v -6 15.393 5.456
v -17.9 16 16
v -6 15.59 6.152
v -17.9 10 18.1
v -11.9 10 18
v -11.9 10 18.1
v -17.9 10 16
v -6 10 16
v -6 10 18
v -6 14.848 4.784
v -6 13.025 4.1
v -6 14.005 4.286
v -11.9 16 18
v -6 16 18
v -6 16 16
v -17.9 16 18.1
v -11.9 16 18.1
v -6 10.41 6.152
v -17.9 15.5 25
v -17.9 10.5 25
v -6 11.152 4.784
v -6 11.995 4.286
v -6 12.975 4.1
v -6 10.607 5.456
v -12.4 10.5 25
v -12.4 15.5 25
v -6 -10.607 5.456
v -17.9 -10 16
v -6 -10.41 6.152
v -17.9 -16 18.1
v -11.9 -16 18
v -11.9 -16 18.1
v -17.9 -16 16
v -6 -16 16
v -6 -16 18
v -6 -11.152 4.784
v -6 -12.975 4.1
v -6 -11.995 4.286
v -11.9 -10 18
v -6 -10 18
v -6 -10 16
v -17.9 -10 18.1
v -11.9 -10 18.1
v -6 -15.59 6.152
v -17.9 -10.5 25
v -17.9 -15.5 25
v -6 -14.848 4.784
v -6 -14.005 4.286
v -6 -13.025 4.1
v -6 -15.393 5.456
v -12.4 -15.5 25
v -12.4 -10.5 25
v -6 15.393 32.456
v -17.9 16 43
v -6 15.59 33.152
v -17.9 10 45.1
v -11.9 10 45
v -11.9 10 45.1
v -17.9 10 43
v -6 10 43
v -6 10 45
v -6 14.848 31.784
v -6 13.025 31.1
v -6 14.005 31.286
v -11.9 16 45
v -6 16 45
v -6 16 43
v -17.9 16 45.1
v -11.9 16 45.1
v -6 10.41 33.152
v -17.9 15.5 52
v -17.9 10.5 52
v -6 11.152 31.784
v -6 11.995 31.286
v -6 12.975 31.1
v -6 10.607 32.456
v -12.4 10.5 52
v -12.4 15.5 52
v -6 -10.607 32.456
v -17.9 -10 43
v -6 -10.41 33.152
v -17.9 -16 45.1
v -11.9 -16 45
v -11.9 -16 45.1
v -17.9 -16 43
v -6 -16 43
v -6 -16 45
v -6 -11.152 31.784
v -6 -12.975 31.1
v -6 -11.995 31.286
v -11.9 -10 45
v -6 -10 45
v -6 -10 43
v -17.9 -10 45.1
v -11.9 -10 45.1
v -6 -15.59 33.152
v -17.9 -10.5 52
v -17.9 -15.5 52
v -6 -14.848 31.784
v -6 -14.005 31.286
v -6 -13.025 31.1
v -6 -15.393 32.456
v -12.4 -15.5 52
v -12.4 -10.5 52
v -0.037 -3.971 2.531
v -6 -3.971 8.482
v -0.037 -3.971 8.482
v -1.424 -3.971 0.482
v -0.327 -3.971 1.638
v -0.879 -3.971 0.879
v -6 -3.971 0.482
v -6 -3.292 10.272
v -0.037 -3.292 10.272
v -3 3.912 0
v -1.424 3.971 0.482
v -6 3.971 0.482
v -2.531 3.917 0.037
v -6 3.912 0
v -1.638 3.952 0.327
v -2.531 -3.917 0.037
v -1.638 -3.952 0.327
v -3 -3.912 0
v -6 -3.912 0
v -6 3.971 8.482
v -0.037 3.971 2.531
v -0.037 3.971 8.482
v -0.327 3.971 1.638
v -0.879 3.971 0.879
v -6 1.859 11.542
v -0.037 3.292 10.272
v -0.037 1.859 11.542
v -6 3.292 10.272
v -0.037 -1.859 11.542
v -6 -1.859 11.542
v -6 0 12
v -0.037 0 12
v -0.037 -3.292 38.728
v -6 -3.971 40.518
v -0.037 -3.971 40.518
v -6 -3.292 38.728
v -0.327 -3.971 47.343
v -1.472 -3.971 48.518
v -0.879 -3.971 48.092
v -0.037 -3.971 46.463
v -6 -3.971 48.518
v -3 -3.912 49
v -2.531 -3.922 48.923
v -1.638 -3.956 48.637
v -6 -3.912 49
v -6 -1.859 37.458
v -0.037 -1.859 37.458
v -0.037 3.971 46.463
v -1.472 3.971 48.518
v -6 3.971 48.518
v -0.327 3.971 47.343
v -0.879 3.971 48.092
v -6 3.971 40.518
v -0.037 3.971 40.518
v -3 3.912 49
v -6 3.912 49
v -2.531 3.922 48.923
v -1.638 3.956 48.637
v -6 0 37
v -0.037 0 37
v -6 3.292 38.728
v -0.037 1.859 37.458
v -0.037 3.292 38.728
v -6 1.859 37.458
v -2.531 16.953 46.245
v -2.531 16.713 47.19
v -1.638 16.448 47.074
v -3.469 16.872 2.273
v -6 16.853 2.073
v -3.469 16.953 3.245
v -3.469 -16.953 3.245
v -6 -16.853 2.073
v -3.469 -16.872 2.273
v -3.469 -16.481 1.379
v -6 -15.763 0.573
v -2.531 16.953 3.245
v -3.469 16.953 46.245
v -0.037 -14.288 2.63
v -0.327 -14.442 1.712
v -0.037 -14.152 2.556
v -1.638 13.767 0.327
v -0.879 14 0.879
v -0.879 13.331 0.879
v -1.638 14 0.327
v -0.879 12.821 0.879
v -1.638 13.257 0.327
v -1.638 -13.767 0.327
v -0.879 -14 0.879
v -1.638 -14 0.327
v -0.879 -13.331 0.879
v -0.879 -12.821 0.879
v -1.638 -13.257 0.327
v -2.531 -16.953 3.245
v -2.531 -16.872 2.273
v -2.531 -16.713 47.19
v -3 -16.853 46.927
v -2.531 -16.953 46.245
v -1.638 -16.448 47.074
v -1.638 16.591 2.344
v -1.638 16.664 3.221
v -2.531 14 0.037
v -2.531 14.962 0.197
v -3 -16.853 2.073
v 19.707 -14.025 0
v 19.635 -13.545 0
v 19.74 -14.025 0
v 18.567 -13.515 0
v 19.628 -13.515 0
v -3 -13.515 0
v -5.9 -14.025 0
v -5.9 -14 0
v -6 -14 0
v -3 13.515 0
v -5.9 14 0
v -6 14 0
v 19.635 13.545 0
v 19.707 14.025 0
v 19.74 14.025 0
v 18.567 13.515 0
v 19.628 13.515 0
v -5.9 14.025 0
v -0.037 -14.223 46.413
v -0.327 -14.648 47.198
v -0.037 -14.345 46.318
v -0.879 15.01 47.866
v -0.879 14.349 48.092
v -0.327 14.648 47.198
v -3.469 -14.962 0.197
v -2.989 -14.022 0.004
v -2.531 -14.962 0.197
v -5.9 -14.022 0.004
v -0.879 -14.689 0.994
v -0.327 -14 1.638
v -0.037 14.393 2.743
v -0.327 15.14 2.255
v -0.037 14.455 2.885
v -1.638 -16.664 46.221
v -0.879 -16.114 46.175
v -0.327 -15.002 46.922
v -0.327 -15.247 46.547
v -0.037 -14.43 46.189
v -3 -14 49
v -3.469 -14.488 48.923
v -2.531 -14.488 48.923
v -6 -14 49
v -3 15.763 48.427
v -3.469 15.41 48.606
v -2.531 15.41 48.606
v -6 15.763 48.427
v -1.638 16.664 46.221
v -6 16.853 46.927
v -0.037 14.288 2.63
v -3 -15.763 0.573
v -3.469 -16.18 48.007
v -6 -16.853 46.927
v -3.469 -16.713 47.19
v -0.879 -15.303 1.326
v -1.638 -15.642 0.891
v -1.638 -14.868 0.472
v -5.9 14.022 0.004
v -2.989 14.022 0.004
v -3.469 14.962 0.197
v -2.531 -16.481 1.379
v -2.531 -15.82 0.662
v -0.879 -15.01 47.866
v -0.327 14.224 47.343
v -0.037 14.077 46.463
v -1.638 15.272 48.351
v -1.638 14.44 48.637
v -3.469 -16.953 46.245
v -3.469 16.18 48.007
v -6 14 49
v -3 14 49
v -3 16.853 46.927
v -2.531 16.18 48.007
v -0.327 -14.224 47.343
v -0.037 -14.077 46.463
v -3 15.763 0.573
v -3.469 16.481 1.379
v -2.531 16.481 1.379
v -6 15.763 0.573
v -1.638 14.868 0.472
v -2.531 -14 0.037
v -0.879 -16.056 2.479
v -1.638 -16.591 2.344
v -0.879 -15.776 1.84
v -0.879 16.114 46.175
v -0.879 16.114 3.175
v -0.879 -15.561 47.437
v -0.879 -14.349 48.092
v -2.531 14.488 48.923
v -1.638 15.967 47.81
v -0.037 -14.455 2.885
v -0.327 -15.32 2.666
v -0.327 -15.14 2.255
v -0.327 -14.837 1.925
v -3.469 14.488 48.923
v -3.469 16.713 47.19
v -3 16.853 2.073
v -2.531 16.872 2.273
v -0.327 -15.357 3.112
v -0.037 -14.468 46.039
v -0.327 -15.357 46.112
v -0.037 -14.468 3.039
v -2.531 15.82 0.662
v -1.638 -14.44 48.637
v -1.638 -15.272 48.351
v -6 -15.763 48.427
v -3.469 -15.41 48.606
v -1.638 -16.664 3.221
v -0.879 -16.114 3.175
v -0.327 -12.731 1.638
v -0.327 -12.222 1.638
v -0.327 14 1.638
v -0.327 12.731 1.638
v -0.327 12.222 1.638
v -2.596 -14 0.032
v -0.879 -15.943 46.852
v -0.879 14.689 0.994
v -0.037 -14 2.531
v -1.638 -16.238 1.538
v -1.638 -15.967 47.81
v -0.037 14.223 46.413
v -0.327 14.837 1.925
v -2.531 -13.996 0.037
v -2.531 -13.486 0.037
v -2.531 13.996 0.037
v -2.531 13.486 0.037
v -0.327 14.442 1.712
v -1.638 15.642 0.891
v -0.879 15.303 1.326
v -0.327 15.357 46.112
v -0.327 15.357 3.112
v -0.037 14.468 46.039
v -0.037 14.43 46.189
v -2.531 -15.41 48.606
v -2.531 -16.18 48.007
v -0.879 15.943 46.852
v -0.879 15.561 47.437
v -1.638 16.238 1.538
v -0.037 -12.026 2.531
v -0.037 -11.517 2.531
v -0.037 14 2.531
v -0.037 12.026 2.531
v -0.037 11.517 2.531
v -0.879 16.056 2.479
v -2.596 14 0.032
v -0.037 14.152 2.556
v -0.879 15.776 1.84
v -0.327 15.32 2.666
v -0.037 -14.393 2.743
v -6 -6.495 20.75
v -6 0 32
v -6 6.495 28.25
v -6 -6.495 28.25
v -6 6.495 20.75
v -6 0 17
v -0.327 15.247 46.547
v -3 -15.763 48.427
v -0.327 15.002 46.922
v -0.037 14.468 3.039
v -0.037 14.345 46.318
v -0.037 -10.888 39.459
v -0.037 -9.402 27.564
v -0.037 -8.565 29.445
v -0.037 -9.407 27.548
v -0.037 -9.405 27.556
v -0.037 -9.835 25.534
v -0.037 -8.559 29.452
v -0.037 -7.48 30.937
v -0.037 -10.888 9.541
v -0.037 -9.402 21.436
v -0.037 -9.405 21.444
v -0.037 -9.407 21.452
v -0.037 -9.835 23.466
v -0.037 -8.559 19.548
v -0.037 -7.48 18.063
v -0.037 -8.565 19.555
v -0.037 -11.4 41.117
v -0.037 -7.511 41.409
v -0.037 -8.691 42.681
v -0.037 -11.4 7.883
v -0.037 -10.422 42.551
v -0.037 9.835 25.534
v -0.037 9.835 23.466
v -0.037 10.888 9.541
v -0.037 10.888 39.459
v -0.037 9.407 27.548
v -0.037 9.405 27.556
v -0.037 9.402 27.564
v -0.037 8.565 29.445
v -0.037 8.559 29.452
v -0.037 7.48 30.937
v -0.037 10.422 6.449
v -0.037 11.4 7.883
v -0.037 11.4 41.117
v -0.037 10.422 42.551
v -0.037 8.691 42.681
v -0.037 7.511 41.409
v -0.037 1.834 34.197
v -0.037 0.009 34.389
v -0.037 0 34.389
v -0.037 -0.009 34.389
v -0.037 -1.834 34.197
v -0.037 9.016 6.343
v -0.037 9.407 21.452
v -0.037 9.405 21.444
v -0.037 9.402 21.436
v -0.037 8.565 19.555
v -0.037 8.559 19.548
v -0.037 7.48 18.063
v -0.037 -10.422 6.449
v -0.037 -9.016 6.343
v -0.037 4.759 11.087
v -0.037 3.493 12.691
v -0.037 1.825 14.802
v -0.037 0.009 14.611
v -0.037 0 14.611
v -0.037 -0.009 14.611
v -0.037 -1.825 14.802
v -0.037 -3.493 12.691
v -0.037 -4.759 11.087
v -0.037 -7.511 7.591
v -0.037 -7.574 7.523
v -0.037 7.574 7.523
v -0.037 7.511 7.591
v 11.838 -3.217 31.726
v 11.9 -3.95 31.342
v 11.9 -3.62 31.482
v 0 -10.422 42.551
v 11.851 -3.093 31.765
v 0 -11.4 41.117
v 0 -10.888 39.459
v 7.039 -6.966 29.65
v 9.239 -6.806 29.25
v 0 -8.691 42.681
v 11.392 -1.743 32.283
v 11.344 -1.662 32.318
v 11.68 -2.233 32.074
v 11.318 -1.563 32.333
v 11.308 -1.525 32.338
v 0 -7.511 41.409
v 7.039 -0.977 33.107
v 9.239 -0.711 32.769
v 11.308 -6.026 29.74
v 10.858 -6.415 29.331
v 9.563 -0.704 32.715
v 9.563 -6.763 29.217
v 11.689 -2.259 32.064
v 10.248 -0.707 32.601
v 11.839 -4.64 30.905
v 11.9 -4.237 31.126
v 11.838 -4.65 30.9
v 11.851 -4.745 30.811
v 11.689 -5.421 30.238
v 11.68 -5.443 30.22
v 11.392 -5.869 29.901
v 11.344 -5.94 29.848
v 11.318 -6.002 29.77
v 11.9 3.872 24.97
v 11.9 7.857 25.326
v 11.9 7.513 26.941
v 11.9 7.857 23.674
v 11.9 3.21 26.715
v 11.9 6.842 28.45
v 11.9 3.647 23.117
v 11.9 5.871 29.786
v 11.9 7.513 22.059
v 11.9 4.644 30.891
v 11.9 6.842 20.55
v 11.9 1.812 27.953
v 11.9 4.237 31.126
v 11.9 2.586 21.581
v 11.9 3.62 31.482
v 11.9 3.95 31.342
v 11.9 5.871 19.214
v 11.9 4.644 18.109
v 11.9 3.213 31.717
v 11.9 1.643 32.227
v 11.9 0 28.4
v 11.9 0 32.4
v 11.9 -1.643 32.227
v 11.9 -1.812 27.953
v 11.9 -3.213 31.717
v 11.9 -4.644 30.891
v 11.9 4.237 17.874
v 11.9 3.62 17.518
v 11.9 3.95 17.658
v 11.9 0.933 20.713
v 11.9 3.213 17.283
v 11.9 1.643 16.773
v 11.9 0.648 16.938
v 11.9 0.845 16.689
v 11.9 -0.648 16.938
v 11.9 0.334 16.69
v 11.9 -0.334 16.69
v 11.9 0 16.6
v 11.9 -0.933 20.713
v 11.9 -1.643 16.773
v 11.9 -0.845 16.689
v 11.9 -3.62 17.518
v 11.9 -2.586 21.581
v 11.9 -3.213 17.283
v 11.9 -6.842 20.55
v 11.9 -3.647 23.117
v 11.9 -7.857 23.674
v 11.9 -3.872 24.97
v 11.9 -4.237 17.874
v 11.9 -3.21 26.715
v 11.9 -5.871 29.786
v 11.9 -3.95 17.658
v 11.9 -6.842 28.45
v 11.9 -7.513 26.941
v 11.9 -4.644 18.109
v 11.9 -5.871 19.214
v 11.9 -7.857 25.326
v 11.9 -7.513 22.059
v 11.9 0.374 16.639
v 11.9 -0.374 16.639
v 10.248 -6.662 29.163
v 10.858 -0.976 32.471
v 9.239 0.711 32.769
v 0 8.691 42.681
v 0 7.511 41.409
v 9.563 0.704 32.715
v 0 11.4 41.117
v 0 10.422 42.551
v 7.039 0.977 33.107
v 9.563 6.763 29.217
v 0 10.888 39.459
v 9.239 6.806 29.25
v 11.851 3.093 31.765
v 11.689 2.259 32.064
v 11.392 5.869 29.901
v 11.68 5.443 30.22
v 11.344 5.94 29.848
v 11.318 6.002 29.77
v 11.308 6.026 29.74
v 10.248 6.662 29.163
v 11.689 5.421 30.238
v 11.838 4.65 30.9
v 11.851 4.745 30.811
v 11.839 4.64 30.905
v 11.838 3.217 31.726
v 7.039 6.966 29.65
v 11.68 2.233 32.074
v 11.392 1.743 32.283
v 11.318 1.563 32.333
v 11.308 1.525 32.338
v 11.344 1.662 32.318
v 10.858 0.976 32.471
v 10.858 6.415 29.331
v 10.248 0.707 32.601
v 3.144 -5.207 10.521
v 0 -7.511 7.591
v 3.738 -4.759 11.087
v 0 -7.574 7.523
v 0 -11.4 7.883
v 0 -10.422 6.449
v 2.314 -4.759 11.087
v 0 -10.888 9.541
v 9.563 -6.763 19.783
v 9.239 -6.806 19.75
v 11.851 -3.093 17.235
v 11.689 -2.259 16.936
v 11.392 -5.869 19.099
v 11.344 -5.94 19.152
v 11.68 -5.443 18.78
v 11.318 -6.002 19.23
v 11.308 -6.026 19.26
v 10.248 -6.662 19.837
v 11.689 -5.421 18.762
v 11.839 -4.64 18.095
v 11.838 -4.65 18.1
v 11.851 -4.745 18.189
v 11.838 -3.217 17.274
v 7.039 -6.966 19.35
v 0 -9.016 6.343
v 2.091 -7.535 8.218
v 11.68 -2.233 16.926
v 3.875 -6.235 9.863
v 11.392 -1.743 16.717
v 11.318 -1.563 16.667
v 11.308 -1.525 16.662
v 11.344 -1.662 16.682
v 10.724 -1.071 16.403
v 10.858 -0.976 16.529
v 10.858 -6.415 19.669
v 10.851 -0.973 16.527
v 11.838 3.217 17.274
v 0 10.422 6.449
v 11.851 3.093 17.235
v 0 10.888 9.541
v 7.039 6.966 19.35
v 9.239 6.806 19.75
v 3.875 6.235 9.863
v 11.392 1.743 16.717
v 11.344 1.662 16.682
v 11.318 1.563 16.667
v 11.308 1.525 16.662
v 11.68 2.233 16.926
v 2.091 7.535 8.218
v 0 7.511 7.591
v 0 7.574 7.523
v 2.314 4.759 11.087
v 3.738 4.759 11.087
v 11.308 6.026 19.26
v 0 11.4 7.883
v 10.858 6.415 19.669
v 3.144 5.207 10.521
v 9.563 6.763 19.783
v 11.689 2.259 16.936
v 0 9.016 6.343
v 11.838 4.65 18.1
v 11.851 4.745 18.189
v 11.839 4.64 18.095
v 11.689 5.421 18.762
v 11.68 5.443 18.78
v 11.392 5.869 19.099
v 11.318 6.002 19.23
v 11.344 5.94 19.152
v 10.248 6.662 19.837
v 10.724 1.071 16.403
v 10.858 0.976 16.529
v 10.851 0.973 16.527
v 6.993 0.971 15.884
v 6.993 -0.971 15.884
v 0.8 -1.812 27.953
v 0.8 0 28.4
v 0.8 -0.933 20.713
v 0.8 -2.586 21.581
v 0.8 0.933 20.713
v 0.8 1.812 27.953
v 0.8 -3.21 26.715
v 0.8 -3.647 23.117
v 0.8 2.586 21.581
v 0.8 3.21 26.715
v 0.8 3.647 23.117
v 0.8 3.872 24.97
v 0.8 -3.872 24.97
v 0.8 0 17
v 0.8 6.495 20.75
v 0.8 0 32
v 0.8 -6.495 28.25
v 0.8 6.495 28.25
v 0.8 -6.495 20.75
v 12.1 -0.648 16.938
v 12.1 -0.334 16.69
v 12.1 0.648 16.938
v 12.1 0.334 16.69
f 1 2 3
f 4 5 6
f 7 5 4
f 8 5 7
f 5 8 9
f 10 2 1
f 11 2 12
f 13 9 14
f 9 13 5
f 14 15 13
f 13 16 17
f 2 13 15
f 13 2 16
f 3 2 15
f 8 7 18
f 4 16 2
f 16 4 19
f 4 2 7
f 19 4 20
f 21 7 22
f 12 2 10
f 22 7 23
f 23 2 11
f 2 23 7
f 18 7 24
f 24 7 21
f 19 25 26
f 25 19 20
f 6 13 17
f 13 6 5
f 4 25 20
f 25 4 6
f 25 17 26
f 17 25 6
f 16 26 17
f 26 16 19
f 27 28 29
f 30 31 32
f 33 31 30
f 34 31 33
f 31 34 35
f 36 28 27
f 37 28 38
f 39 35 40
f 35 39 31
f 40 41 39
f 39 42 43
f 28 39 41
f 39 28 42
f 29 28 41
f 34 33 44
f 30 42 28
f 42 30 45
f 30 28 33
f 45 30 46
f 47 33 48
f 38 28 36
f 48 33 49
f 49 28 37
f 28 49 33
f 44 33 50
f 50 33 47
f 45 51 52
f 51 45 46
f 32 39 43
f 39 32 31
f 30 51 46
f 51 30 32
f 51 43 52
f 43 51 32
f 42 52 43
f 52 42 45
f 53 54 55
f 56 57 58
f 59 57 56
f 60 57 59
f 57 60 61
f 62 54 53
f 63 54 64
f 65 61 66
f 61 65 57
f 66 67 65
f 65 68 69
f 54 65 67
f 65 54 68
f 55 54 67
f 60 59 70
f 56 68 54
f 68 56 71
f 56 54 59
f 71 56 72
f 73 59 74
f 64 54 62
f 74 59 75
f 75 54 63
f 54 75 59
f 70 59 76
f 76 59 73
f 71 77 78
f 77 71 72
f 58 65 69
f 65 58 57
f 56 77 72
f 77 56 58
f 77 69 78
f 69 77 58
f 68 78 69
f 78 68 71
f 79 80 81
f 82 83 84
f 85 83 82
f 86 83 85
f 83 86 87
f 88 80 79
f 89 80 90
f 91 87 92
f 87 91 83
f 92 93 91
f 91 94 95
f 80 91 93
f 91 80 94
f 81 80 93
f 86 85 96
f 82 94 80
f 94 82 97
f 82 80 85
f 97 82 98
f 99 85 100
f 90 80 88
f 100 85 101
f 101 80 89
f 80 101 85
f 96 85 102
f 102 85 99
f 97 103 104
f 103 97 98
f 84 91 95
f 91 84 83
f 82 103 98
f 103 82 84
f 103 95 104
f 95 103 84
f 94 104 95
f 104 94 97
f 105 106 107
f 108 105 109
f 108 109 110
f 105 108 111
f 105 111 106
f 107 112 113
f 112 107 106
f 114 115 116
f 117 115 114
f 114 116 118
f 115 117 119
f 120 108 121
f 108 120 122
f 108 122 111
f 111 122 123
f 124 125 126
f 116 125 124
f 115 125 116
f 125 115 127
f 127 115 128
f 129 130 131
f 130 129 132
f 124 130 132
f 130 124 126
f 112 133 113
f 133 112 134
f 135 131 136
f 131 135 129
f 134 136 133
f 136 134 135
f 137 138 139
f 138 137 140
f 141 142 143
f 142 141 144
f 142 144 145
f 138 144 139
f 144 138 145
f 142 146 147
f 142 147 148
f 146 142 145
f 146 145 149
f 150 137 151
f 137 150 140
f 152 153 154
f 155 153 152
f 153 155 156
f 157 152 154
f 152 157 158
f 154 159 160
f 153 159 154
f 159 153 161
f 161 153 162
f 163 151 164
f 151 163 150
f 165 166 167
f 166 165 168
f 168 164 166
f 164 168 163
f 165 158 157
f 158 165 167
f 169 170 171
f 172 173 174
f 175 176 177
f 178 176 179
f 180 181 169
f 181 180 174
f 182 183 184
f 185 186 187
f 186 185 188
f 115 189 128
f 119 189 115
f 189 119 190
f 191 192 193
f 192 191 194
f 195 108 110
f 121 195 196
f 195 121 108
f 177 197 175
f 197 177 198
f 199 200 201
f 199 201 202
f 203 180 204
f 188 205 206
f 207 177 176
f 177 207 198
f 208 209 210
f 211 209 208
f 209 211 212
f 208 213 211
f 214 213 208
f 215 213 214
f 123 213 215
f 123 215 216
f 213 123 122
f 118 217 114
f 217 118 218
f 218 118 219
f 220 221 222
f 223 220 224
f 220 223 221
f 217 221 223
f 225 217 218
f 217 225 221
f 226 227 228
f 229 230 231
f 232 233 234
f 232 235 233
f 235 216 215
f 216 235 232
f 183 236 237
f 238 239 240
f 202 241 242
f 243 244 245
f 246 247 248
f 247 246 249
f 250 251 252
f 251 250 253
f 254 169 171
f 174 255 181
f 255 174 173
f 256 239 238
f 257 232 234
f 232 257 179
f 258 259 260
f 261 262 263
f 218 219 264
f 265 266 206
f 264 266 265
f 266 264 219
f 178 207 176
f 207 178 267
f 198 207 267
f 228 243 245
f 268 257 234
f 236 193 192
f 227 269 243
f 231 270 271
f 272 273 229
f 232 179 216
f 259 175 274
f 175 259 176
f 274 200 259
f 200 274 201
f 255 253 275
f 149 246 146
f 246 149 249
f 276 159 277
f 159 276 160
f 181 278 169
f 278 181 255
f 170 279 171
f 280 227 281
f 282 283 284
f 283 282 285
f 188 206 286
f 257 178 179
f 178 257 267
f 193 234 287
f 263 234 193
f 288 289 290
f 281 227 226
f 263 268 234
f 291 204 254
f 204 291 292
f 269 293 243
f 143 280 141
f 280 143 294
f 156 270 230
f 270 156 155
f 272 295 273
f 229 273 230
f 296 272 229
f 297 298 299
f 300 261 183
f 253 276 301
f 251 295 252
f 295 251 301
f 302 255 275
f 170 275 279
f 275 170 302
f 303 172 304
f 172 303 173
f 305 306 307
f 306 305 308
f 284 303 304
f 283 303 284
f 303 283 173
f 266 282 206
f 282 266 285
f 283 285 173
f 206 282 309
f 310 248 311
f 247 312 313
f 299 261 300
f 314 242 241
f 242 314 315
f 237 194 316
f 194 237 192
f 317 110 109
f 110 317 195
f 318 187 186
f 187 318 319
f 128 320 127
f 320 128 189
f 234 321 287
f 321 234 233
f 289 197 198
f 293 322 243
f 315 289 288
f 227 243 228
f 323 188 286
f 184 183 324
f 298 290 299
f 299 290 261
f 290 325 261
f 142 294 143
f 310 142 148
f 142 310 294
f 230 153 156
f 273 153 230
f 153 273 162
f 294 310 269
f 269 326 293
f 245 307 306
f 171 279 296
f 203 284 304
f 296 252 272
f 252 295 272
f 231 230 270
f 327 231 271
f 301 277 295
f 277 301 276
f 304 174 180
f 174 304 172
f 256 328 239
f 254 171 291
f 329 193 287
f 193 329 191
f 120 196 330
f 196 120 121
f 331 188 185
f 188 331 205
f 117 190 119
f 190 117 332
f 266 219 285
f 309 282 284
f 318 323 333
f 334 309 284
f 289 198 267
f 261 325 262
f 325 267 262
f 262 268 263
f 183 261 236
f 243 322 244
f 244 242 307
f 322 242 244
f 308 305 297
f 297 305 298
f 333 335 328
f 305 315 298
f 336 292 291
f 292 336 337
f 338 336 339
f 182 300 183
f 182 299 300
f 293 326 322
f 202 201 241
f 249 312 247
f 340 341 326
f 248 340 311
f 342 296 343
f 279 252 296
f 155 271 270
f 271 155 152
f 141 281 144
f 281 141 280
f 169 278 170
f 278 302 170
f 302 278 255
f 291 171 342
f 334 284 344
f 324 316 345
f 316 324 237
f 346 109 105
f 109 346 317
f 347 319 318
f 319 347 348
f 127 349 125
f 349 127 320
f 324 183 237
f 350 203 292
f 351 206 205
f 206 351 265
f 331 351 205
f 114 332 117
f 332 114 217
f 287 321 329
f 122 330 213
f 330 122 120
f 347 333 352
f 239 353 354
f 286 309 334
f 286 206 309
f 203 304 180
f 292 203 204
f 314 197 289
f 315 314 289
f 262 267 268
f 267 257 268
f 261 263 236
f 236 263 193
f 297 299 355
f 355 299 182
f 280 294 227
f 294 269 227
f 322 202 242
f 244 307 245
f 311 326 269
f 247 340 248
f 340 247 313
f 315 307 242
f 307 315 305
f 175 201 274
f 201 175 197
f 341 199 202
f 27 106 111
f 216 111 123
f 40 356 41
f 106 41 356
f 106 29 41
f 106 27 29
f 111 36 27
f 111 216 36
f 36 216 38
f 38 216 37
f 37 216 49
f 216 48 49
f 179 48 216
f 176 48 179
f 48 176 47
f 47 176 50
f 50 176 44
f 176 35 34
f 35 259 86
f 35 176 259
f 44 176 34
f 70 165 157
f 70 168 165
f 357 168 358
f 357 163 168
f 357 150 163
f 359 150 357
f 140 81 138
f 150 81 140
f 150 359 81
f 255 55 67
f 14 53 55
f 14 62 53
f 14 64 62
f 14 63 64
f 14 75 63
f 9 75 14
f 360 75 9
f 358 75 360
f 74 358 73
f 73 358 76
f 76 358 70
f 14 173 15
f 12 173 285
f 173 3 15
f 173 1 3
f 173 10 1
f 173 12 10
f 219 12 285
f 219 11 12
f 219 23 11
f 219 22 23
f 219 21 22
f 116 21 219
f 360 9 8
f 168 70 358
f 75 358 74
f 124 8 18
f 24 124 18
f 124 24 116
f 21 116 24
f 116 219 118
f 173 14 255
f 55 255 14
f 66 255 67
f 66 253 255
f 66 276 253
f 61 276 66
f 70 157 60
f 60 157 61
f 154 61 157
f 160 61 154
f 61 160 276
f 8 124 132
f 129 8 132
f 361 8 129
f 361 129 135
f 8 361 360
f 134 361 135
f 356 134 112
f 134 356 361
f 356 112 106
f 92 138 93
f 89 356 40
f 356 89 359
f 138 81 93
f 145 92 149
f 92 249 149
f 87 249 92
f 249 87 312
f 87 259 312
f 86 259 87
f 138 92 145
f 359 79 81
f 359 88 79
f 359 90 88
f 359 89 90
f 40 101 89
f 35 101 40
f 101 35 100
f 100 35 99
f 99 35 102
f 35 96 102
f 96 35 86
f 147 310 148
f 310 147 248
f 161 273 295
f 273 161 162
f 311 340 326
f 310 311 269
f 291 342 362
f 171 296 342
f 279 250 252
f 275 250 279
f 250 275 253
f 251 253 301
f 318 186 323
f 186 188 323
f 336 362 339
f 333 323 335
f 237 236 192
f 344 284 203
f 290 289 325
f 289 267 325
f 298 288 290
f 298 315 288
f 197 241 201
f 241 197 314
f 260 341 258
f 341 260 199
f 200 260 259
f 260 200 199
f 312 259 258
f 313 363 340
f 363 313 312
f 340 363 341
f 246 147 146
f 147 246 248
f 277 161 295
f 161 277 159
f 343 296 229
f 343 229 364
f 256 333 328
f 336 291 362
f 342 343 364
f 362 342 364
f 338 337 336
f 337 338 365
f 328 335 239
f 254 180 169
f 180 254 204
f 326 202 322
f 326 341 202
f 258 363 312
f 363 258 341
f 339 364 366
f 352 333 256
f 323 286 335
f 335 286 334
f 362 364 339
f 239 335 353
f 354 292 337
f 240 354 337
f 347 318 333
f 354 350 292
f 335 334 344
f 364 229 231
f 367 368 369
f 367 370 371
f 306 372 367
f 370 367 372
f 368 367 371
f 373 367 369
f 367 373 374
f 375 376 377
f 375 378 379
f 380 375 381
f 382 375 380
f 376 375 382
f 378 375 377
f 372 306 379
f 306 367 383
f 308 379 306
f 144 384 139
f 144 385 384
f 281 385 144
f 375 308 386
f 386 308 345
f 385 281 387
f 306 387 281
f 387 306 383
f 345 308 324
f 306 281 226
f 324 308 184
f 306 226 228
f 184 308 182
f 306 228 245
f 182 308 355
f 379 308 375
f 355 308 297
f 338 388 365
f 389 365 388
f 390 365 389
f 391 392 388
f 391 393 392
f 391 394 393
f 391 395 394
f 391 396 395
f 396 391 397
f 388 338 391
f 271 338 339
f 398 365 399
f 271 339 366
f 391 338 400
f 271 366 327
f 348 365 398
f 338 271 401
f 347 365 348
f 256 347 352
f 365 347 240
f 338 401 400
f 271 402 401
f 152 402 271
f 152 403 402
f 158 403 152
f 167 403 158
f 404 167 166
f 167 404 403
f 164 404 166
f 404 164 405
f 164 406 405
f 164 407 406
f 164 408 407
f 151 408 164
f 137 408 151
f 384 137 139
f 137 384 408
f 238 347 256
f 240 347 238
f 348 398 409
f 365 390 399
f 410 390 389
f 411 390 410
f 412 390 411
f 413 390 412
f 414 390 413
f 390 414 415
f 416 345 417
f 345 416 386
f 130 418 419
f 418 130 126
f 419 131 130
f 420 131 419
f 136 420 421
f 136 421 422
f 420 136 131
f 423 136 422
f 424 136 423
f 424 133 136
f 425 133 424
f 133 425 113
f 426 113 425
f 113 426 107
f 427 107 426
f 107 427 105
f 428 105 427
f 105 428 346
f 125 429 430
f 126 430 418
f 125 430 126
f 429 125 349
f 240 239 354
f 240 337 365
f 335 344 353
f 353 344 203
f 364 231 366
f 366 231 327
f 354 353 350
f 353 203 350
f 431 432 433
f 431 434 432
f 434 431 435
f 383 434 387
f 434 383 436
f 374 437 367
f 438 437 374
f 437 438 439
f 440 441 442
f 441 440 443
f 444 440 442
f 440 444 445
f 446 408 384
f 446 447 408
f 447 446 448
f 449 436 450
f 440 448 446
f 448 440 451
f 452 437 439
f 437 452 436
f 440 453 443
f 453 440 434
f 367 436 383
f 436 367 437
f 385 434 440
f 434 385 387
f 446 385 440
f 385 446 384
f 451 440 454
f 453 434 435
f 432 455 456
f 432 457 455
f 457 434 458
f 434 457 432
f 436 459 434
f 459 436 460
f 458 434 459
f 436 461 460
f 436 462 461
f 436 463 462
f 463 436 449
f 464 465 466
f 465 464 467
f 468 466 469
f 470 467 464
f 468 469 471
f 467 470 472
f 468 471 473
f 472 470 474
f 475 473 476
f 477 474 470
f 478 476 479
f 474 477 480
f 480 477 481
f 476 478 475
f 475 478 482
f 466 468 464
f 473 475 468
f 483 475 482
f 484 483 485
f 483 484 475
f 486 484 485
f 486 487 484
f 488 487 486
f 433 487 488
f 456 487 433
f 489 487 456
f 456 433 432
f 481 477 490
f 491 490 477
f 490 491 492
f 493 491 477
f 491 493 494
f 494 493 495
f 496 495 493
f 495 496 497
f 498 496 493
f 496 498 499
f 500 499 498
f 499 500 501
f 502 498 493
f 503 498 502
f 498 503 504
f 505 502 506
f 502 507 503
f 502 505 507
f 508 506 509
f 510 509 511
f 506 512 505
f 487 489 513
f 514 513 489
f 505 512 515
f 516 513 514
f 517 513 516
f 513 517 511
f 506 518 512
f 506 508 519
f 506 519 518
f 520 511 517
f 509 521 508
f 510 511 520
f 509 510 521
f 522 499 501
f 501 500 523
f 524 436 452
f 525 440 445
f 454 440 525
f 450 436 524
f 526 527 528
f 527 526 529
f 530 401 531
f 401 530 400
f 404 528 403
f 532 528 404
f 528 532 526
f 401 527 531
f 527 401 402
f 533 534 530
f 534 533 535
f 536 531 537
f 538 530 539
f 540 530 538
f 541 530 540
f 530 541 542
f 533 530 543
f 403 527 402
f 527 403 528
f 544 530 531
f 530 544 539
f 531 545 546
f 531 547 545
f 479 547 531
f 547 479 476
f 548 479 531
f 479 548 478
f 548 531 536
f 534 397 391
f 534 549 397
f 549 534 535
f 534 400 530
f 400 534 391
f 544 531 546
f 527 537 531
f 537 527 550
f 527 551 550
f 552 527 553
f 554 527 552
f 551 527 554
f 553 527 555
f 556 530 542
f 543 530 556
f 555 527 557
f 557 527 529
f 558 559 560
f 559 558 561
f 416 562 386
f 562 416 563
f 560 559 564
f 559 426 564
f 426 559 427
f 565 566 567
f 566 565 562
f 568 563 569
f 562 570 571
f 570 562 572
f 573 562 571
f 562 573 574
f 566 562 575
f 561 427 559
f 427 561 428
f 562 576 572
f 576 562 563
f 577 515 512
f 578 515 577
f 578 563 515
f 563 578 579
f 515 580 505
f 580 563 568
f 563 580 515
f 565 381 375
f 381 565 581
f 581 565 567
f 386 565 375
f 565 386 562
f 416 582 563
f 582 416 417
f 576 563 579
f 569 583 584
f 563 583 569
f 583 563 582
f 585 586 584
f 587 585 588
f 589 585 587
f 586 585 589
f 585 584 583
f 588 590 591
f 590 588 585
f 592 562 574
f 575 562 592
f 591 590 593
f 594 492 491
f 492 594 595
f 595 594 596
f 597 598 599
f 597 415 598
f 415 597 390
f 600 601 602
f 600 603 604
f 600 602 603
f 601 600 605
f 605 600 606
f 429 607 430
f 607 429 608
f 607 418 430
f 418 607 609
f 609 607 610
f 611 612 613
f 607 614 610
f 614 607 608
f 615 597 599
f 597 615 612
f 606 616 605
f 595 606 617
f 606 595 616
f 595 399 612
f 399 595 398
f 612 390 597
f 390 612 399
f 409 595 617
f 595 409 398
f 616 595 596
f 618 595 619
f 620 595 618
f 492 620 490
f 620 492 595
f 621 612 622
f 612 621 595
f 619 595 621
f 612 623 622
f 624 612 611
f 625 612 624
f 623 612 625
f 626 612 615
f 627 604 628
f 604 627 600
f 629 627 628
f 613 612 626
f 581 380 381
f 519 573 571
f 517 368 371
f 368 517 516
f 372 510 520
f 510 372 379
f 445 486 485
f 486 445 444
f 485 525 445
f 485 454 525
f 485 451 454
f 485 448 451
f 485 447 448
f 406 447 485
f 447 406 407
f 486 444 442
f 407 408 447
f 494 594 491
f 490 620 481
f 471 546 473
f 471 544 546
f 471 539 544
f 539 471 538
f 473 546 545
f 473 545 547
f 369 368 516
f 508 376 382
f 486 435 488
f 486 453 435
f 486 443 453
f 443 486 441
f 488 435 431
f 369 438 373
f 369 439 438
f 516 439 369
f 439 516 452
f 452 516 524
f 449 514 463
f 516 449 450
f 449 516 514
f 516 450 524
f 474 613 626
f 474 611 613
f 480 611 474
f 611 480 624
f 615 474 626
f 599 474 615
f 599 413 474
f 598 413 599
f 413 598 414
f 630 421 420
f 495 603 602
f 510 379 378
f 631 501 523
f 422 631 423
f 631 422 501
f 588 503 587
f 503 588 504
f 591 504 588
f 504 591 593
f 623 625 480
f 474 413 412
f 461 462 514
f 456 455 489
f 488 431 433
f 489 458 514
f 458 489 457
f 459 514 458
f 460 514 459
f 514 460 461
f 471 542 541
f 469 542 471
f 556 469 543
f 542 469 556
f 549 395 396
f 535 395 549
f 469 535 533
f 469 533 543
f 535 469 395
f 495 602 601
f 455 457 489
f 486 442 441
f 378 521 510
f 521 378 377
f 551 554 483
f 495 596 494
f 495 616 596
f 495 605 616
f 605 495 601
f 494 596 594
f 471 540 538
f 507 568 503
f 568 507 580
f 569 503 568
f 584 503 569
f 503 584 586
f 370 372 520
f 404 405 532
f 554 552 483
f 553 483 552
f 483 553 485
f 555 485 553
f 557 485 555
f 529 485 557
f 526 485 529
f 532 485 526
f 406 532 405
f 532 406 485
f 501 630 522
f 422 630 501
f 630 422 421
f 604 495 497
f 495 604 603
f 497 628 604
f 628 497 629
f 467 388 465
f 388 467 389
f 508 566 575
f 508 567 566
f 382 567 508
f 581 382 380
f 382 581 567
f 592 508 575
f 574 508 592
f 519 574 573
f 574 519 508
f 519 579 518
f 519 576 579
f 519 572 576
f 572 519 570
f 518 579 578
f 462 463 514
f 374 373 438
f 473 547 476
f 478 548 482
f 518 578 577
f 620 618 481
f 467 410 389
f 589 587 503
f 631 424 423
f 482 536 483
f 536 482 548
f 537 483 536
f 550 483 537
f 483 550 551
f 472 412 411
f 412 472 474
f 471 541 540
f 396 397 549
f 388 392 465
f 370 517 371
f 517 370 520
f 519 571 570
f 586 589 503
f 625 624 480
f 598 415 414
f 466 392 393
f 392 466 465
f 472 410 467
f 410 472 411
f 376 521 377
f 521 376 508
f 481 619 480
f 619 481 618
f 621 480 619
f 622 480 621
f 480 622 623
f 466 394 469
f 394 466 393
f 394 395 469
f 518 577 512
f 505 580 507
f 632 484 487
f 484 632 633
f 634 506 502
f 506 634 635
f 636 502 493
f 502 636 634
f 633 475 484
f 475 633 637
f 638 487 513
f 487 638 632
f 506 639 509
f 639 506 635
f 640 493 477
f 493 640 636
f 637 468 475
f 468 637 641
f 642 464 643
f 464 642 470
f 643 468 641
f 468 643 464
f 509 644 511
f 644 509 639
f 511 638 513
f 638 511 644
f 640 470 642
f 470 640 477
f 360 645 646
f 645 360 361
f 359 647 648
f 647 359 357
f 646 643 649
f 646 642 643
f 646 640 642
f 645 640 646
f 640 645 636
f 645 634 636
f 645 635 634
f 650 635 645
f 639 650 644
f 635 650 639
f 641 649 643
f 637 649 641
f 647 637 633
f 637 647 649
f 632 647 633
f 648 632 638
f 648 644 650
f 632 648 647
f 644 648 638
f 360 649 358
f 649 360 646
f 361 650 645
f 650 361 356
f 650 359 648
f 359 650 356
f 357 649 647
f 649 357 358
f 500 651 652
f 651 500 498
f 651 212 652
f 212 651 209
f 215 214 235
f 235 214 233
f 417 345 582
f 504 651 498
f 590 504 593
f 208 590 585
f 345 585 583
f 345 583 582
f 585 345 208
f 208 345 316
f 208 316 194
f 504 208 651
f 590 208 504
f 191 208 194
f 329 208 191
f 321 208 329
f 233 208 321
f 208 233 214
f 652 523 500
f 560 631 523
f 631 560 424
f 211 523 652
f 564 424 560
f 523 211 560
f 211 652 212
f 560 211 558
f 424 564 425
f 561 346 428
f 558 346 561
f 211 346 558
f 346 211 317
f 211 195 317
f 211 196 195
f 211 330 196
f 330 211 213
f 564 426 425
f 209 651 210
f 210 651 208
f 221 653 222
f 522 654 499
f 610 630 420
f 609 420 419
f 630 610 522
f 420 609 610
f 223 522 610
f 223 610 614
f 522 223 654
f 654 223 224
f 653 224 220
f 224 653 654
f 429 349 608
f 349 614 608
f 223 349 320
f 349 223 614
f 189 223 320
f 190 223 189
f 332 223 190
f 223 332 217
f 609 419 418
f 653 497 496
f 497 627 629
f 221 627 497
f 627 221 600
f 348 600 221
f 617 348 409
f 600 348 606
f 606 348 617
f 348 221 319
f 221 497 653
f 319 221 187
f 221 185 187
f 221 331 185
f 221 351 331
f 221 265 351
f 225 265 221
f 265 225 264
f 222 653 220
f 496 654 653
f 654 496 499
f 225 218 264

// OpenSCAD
// [FL_INDEX: keywords="openscad, 3d_parametric, Minimalist_but_versatile_Ultimaker_spool_holder, csg_solid" | COT="Parametric OpenSCAD design from 3DCodeverse"]
// Title: Minimalist but versatile Ultimaker spool holder

// internal diameter (make it tight)
tube_d=7.8;
// wall thickness around the rod
tube_wall_th=4;
// length of the wall around the rod
base_rod_len=12;
// nut diameter with enough freeplay
tube_nut_d=15;
// nut heigth with enough freeplay
tube_nut_h=6.7;

// optional support (zero to disable)
support_th=0.4;

/* [Hidden] */

tol=0.1+0;

hook_wall_th= 6+0;
hook_sx=12+0;
hook_dist_z=27+0;
hook_dist_y=26+0;
hook_tab_sz=14+0;
hook_notch_sx=6+0;
hook_notch_sz=5+2+0;
hook_notch_skew=0.5+0;

plate_additional_z= 8+0;

hook_plate_sy= hook_dist_y+hook_wall_th+2;
hook_plate_sz= hook_dist_z + hook_tab_sz + plate_additional_z;

module um_reel_hook_plate()
{
	module one_arm()
	{
		hull()
		{
			translate([-(hook_wall_th-1)/2,hook_wall_th/2,0])
				cylinder(r=(hook_wall_th-1)/2, h=tol, $fs=1);
			translate([0,0,hook_sx])
				cube([hook_sx, hook_wall_th, hook_tab_sz-hook_sx]);
		}

		// The notch
		translate([hook_sx-hook_notch_sx,0,hook_tab_sz])
		{
			hull()
			{
				cube([hook_notch_sx, hook_wall_th, tol]);
				translate([hook_notch_skew,hook_notch_skew,hook_notch_sz-tol])
					cube([hook_notch_sx-hook_notch_skew, hook_wall_th-hook_notch_skew*2, tol]);
			}
		}
	}

	// Hook body
	difference()
	{
		union()
		{
			// 4 hooks
			translate([hook_wall_th-tol,-hook_wall_th/2, plate_additional_z/2])
				for(z=[0,1])
					translate([0,0,z*hook_dist_z])
						for(y=[-1,+1])
							translate([0,y*hook_dist_y/2,0])
								one_arm();

			// Plate
			difference()
			{
				// Rounded main plate
				hull()
				{
					for(y=[-1,+1]) hull()
					{
						for(z=[0,+1])
						translate([0,y*(hook_plate_sy-hook_wall_th)/2, hook_wall_th/2+z*(hook_plate_sz-hook_wall_th)])
							rotate([0,90,0])
							{
								translate([0,0,hook_wall_th/2])
									sphere(r=hook_wall_th/2, $fs=1);
								translate([0,0,hook_wall_th/2])
									cylinder(r=hook_wall_th/2, h=hook_wall_th/2);
							}
					}
				}

				// Leave room for the nylock nuts (make it mountable!)
				translate([-tol,0,hook_plate_sz/2])
				for(z=[-1,+1]) scale([1,1,z])
					translate([0,0,hook_plate_sz/2])
				{
					rotate([0,90,0])
						hull()
					{
						cylinder(r=8/2, h=hook_wall_th+2*tol);
						translate([plate_additional_z,0,0])
							cylinder(r=8/2, h=hook_wall_th+2*tol);
					}
				}

			}

		}
	}
	
	// Rod mount
	translate([tol,0,hook_plate_sz/2]) rotate([0,-90,0])
	{
		cylinder(r1=min(tube_d/2,tube_nut_d/2)+tube_wall_th+2,r2=tube_d/2+tube_wall_th,h=base_rod_len);
		for(r=[30,-30,180-30,180+30]) rotate([0,0,r])
			hull()
			{
				translate([tube_d/2+tube_wall_th - tube_wall_th,0,0])
					cylinder(r=tube_wall_th,h=base_rod_len,$fs=1);
					
				translate([hook_plate_sz/2 - (tube_wall_th)*1.414,0,0])
					cylinder(r=tube_wall_th/2, h=tol);
			}
	}
}



rotate([0,0,180]) // for a better cooling when printer on an UM!!

difference()
{
	difference()
	{
		um_reel_hook_plate();
		translate([hook_wall_th+tol,0,hook_plate_sz/2])
			rotate([0,-90,0])
				cylinder(r=tube_d/2,h=base_rod_len+tube_d+2*tol);
	}
	translate([hook_wall_th - tube_nut_h - tol,0,hook_plate_sz/2])
		rotate([0,90,0])
			cylinder(r=tube_nut_d/2, h= tube_nut_h+2*tol, $fn=6);

}

// Make it printer friendly
if(support_th>0)
	intersection()
	{
		translate([-50,-50,0]) cube([100,100,100]);
		
		for(y=[-1,1]) scale([1,y,1]) translate([0,hook_plate_sy*0.4+0.96,-1]) rotate([38.3,0,0])
			translate([-hook_wall_th+tol,-support_th/2,0])
				hull()
				{
					cube([20+hook_wall_th,support_th,tol]);
					translate([0,0,hook_plate_sz/2 - tube_d/2 - tube_wall_th + 6])
						cube([base_rod_len+hook_wall_th,support_th,tol]);
				}
	}
